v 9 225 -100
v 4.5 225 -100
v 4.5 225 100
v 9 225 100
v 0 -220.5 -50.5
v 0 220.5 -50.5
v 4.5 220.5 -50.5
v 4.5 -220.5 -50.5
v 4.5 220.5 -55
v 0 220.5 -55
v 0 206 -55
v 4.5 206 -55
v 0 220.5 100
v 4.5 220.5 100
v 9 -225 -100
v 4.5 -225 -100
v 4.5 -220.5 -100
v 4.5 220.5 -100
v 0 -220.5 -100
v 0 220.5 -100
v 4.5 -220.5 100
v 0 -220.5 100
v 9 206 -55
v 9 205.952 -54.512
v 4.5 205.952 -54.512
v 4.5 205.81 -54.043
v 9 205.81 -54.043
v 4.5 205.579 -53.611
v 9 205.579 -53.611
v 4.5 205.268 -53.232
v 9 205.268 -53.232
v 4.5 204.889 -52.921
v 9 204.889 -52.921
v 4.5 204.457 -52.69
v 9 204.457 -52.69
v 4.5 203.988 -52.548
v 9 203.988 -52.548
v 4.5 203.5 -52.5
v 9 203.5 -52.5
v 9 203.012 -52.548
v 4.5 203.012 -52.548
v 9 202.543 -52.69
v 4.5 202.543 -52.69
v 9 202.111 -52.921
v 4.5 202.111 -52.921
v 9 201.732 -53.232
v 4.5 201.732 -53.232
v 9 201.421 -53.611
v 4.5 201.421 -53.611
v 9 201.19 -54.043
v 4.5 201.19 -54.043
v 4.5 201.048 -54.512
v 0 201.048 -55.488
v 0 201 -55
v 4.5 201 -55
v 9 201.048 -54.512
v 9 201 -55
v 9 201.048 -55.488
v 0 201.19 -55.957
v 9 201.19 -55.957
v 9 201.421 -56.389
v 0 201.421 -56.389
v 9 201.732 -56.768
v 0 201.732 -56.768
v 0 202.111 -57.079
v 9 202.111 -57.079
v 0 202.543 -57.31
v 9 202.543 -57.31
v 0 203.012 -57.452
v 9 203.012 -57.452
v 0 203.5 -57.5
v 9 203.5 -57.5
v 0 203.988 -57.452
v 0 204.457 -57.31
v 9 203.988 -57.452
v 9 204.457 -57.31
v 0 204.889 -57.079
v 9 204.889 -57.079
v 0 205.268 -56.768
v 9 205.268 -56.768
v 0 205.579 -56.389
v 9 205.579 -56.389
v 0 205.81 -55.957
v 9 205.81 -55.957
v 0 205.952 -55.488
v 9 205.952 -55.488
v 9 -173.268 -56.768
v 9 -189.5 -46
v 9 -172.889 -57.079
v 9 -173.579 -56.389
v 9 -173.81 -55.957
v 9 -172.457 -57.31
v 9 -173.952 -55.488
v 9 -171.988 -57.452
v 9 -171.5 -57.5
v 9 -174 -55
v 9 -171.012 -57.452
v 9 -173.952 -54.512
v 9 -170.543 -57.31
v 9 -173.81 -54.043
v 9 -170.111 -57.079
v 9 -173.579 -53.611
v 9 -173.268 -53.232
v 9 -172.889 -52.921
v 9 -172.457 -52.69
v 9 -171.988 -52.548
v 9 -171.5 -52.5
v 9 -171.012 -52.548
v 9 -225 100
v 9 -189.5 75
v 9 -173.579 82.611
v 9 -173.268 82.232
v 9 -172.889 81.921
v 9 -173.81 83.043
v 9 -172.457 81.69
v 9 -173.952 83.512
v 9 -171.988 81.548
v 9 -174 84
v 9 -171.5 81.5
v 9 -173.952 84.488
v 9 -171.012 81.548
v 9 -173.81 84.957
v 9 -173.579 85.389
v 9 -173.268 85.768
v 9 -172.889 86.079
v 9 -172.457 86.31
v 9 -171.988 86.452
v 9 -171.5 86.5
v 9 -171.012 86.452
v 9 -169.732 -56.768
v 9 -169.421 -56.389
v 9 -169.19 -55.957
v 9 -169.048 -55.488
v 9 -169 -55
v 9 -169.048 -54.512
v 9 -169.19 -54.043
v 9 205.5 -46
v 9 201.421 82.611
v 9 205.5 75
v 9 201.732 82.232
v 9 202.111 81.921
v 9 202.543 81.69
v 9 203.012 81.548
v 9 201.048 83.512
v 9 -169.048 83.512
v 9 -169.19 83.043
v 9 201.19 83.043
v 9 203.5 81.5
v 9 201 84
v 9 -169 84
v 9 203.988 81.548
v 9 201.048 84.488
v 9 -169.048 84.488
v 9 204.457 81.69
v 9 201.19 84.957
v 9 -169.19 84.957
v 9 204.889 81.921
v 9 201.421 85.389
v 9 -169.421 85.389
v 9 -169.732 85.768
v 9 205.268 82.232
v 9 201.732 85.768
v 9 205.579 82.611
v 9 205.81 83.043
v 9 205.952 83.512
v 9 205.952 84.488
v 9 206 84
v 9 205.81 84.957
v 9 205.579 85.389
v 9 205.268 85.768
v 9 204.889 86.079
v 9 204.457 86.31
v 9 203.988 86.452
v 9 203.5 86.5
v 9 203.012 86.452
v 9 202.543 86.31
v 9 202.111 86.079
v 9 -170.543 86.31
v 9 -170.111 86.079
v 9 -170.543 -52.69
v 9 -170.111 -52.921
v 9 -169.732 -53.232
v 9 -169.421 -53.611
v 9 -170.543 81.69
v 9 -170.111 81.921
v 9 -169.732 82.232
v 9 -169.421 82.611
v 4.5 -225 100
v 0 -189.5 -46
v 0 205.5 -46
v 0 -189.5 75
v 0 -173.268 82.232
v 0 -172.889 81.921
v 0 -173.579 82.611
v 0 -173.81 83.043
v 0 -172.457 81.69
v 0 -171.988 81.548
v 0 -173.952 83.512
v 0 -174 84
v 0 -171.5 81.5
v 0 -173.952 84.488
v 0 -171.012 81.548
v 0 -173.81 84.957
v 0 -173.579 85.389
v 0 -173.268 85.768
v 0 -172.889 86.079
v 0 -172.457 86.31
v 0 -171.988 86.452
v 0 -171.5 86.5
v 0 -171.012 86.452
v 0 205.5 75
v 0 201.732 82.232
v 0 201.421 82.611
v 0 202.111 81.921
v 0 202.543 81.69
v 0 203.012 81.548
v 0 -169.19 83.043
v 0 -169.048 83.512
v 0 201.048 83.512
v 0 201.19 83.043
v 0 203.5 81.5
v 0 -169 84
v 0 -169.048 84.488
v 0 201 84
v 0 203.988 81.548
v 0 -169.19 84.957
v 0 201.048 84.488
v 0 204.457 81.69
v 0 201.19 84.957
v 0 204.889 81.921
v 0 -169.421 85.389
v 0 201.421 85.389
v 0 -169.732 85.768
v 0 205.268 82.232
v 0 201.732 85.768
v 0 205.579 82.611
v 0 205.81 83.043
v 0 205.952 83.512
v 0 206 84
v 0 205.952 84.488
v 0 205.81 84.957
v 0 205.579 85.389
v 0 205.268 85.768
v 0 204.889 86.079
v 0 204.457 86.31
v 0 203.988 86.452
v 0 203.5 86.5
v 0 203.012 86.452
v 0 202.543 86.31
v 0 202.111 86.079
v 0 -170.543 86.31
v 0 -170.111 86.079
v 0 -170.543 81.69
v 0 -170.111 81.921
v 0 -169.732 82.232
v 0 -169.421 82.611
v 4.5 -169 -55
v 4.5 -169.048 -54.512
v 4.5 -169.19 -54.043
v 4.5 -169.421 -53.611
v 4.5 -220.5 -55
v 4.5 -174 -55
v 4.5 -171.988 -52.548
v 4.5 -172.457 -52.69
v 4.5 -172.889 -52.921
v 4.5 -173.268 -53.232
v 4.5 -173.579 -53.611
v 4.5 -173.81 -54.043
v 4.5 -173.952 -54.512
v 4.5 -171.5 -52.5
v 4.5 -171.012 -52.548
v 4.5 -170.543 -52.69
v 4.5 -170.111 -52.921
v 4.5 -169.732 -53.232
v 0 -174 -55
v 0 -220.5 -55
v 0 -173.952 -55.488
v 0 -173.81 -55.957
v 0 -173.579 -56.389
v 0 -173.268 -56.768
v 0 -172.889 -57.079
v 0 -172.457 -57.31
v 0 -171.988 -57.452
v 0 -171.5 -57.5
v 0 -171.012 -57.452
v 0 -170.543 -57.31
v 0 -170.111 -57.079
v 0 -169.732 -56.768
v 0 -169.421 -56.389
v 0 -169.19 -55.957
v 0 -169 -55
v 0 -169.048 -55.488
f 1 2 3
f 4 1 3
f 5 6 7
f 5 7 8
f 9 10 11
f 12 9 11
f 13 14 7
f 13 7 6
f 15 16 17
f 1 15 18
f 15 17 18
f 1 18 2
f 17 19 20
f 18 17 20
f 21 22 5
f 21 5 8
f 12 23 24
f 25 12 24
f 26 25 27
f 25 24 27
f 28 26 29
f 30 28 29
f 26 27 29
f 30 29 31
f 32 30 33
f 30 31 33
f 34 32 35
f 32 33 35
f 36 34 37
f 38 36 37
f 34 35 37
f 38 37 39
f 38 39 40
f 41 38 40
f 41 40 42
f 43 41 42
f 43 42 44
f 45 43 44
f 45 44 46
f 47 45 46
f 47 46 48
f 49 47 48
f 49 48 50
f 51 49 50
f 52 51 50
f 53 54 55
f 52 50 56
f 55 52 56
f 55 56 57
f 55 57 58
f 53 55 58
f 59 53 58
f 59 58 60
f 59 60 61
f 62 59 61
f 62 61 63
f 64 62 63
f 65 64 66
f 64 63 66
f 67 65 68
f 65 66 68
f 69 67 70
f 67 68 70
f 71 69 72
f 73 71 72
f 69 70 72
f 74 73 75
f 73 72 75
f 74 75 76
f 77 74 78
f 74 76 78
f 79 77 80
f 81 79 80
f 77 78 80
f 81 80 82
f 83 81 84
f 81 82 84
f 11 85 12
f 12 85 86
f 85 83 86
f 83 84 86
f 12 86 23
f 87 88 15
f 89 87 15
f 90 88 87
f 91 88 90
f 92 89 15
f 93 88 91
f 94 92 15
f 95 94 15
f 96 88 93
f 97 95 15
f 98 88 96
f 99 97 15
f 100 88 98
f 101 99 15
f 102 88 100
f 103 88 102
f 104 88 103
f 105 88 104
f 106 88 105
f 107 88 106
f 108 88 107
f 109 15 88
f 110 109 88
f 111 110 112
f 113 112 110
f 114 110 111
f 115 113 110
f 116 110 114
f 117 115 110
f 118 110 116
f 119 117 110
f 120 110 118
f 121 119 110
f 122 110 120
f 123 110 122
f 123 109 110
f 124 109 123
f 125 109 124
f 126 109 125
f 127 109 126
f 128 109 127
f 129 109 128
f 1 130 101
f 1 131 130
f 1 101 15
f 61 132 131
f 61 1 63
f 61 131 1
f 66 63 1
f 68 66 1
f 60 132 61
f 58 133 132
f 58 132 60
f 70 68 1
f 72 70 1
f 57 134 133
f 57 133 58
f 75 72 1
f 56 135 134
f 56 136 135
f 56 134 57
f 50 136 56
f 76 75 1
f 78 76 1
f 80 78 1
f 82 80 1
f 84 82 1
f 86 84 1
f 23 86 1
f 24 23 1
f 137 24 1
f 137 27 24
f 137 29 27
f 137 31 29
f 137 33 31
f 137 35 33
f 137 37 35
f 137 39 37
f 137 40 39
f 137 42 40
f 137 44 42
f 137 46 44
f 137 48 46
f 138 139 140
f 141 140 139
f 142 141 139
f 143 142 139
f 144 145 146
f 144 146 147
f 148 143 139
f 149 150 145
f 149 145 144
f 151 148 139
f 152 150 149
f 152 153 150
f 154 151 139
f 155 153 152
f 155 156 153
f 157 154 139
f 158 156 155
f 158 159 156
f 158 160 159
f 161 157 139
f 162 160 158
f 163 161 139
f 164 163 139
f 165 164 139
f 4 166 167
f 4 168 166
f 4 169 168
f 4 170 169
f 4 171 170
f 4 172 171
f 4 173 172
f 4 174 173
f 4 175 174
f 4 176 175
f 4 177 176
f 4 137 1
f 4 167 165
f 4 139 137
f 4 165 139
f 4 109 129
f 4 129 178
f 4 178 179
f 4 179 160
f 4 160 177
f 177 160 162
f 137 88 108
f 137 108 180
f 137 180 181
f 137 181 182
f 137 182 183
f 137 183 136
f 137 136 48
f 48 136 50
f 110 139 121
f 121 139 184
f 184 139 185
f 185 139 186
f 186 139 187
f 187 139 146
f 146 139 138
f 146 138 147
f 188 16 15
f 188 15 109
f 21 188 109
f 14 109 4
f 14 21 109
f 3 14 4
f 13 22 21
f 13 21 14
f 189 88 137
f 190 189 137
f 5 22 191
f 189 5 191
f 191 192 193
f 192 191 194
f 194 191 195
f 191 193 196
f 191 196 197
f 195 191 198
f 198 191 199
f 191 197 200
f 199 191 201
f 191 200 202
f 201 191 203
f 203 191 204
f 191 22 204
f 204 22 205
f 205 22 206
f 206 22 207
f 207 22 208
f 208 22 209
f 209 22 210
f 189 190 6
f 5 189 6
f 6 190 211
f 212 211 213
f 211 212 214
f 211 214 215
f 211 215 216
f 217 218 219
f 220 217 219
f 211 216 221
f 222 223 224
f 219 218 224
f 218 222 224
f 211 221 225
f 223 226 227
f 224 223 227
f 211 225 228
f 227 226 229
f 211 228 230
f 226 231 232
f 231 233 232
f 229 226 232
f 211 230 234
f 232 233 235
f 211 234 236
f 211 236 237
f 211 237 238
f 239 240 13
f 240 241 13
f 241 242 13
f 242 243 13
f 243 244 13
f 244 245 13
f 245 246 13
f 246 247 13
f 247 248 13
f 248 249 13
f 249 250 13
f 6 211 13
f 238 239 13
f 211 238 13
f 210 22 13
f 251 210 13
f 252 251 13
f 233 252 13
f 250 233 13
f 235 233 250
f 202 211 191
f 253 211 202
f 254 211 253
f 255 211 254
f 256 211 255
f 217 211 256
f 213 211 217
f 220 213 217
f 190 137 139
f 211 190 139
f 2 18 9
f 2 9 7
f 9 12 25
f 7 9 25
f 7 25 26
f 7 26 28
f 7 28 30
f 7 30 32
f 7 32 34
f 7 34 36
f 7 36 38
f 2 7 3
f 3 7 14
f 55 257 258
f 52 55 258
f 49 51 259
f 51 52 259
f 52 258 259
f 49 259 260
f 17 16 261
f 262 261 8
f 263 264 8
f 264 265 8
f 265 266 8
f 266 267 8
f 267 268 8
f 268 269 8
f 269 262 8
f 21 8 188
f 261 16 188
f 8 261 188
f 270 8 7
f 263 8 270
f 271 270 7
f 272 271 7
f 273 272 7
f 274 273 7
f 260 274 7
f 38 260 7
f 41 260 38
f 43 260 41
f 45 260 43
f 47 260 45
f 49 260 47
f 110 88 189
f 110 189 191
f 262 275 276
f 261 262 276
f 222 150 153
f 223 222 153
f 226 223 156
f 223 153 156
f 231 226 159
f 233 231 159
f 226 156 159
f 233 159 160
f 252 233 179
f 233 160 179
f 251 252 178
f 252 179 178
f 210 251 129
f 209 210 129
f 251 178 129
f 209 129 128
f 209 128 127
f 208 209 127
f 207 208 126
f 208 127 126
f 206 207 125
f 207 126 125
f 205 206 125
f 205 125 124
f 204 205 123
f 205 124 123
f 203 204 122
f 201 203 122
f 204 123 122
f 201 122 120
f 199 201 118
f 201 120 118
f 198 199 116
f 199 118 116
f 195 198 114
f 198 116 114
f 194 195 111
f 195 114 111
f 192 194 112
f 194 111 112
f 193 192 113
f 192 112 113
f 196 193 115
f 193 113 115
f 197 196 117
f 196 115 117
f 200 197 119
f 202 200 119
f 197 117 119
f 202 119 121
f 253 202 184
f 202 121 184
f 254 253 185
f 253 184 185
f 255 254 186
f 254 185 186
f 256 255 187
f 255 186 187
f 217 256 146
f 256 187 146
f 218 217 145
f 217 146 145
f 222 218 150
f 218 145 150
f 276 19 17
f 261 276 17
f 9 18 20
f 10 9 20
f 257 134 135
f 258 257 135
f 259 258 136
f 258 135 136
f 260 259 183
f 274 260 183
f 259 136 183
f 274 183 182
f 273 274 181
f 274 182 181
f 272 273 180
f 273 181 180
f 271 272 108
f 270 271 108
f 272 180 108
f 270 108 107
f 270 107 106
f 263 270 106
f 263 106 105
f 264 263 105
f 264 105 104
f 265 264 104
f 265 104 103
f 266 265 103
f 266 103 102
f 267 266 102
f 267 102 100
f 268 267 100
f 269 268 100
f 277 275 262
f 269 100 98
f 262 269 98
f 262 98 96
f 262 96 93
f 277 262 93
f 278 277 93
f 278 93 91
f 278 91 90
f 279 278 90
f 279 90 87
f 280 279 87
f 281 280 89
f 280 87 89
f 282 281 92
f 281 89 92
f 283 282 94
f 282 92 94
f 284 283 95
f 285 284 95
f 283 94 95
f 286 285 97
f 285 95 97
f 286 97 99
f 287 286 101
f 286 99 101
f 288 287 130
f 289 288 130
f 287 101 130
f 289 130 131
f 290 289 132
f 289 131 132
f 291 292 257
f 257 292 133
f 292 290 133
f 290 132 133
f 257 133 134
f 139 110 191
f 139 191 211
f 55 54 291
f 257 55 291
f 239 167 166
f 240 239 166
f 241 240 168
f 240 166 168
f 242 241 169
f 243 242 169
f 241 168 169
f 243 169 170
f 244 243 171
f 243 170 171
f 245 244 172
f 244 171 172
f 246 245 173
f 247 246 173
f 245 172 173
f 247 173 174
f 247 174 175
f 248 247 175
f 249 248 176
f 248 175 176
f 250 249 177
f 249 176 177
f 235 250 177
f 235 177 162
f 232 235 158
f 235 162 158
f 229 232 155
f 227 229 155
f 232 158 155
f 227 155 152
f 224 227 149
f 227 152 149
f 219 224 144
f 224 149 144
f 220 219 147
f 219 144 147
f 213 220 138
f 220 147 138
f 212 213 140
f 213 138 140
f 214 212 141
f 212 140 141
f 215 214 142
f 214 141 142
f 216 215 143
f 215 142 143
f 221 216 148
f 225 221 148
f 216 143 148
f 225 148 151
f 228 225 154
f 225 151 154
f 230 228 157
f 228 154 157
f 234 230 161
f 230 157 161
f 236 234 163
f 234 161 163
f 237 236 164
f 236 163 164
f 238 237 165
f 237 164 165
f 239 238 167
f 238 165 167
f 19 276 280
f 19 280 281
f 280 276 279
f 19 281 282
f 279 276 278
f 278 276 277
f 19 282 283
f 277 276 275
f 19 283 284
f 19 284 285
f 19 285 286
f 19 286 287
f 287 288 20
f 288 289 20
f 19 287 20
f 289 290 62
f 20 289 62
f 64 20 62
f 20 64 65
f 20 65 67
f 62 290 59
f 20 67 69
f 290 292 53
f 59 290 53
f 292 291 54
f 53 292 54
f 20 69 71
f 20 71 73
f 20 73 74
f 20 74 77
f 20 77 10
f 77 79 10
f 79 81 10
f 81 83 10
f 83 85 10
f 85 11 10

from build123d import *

# Parameters (mm, degrees)
F0_W      = 450
F0_H      = 200
F1_DEPTH  = 9
F2_W      = 4.5
F2_H      = 200
F3_DEPTH  = 4.5
F4_W      = 4.5
F4_H      = 200
F5_DEPTH  = 4.5
F6_W      = 441
F6_H      = 4.5
F7_DEPTH  = 4.5
F8_W      = 395
F8_H      = 121
F9_DEPTH  = 9
F10_R     = 2.5
F11_DEPTH = 9


with BuildPart() as f1:
    # F0 (on Right) → F1 (new body)
    with BuildSketch(Plane.YZ):
        Rectangle(F0_W, F0_H)
    extrude(amount=F1_DEPTH)

    # F2 (on face) → F3 (cut)
    with BuildSketch(Plane.XZ.offset(225)):
        with Locations((2.25, 0)):
            Rectangle(F2_W, F2_H)
    extrude(amount=-F3_DEPTH, mode=Mode.SUBTRACT)

    # F4 (on face) → F5 (cut)
    with BuildSketch(Plane(origin=(0, 225, 0), x_dir=(-1, 0, 0), z_dir=(0, 1, 0))):
        with Locations((-2.25, 0)):
            Rectangle(F4_W, F4_H)
    extrude(amount=-F5_DEPTH, mode=Mode.SUBTRACT)

    # F6 (on face) → F7 (cut)
    with BuildSketch(Plane(origin=(0, 0, 0), x_dir=(0, -1, 0), z_dir=(-1, 0, 0))):
        with Locations((0, -52.75)):
            Rectangle(F6_W, F6_H)
    extrude(amount=-F7_DEPTH, mode=Mode.SUBTRACT)

    # F8 (on face) → F9 (cut, through all)
    with BuildSketch(Plane.YZ.offset(9)):
        with Locations((8, 14.5)):
            Rectangle(F8_W, F8_H)
    extrude(amount=-F9_DEPTH, mode=Mode.SUBTRACT)

    # F10 (on face) → F11 (cut, through all)
    with BuildSketch(Plane.YZ.offset(9)):
        with Locations((203.5, 84)):
            Circle(F10_R)
        with Locations((-171.5, 84)):
            Circle(F10_R)
        with Locations((-171.5, -55)):
            Circle(F10_R)
        with Locations((203.5, -55)):
            Circle(F10_R)
    extrude(amount=-F11_DEPTH, mode=Mode.SUBTRACT)


solid = f1.part
